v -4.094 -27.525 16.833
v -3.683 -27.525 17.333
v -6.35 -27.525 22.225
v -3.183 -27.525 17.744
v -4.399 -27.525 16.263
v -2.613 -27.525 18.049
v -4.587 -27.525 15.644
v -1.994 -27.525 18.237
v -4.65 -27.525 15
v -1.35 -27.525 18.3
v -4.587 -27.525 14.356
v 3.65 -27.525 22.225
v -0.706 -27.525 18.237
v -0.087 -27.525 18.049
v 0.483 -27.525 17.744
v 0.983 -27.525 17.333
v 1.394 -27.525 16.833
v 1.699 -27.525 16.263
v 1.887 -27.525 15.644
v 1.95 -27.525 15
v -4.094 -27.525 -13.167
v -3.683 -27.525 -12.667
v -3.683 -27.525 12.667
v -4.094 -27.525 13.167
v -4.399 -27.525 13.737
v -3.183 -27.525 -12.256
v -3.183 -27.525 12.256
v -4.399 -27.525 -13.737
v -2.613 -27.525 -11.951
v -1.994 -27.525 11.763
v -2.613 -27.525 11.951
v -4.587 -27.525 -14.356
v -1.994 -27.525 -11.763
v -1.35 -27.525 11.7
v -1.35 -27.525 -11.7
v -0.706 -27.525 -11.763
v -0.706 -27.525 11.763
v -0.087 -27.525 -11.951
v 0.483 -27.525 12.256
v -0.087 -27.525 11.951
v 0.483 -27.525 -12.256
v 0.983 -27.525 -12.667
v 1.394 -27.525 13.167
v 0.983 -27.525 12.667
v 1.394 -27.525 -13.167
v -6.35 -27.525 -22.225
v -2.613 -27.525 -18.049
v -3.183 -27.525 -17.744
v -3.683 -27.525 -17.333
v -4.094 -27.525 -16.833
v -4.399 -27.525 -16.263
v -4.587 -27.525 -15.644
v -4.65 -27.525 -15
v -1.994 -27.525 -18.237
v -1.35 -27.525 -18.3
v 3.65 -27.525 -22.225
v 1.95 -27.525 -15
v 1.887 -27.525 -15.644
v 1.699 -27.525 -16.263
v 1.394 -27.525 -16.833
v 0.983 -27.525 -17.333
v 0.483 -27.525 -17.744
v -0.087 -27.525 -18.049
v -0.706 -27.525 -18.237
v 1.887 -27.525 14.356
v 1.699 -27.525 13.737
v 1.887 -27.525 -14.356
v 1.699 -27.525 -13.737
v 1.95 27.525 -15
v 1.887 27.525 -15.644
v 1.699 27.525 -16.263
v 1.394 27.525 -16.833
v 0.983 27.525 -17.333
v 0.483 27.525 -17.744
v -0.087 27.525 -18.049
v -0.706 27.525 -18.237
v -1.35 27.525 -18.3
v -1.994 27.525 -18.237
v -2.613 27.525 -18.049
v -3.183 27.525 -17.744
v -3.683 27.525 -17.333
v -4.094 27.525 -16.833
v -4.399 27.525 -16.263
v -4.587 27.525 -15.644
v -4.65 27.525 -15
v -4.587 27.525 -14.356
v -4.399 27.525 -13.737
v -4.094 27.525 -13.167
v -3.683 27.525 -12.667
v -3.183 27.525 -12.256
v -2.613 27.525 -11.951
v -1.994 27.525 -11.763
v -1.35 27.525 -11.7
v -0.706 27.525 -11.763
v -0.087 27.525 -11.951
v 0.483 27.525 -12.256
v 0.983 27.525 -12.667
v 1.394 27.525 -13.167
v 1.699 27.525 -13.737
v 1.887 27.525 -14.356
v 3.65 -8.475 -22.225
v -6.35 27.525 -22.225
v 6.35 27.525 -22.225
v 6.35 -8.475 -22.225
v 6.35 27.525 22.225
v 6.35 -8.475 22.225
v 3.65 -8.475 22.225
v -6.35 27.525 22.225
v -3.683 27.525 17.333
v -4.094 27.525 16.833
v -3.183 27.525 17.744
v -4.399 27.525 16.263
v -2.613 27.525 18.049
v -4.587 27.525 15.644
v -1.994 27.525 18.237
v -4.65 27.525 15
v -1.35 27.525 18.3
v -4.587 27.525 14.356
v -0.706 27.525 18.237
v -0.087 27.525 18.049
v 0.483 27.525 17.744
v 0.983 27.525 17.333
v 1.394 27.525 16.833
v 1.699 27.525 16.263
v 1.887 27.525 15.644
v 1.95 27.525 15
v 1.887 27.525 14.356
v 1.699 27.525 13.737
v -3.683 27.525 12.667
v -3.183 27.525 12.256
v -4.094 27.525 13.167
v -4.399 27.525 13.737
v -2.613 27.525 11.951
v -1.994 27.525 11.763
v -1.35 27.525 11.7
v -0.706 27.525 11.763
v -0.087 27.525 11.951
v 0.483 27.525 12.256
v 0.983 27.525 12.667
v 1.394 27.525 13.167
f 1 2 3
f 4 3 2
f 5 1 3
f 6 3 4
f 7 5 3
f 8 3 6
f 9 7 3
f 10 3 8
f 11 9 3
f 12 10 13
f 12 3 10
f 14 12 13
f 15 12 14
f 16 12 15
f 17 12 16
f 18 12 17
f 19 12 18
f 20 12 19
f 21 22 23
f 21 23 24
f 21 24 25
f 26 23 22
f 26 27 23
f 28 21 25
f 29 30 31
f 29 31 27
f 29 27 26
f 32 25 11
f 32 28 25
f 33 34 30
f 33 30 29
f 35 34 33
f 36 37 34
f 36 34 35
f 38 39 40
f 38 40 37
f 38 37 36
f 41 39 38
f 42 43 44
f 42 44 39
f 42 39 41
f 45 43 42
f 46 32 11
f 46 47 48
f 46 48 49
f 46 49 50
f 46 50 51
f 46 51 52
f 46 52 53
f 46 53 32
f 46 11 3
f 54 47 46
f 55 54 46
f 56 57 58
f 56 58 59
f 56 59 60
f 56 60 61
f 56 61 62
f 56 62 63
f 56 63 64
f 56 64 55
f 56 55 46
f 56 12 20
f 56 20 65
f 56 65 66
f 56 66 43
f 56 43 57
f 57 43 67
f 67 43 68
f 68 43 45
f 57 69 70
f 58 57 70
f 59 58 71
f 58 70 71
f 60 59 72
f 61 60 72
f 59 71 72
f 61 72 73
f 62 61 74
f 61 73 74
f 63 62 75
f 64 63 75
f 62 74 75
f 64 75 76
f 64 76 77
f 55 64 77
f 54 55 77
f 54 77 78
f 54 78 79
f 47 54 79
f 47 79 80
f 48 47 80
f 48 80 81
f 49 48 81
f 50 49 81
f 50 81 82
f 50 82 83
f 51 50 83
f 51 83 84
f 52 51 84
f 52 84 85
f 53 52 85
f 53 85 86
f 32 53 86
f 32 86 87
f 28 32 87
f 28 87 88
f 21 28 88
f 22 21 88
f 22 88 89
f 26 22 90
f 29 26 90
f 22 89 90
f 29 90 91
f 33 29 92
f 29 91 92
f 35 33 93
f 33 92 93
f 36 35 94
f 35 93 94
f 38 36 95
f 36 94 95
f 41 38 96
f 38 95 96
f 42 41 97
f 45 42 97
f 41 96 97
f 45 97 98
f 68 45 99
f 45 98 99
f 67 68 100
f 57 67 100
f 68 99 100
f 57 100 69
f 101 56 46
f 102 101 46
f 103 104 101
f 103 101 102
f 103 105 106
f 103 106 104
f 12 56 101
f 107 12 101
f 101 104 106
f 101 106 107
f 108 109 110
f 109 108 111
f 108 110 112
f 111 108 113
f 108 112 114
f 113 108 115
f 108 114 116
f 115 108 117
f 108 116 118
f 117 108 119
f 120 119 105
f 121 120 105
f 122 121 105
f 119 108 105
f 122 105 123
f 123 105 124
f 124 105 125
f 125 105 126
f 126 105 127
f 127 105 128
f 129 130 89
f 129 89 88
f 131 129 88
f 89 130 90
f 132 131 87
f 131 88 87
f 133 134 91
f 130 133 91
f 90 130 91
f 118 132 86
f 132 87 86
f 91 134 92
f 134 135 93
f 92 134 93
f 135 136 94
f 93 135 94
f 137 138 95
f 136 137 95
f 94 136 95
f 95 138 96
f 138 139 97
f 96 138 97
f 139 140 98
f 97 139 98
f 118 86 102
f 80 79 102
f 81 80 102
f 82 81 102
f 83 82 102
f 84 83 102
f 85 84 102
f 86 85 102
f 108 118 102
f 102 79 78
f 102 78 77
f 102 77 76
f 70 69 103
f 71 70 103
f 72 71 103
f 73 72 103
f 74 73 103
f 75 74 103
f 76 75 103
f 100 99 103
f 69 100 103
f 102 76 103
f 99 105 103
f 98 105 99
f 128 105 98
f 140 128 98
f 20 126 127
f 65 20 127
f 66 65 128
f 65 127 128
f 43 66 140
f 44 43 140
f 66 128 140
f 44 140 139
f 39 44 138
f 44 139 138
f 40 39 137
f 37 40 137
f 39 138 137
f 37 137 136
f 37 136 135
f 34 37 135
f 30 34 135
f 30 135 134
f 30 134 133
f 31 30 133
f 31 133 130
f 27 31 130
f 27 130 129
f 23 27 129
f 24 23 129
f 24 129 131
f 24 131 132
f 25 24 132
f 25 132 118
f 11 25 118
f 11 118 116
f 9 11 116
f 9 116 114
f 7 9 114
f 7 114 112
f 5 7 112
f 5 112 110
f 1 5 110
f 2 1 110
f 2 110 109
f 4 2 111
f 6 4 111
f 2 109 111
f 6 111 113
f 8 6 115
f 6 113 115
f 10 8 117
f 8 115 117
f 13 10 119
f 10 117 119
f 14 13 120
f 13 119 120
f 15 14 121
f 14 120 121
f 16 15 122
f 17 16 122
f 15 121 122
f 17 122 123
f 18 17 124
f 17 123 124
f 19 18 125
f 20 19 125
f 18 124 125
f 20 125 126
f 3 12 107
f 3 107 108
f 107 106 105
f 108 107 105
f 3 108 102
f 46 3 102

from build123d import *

# Parameters (mm, degrees)
SKETCH1_W            = 44.45
SKETCH1_H            = 55.05
BOSS_EXTRUDE1_DEPTH  = 6.35
SKETCH2_W            = 2.7
SKETCH2_H            = 19.05
CUT_EXTRUDE1_DEPTH   = 53.666408886
M6_CLEARANCE_HOLE1_D = 6.6


with BuildPart() as part:
    # Sketch1 → Boss-Extrude1 (new, symmetric)
    with BuildSketch(Plane(origin=(0, 0, 0), x_dir=(0, 0, -1), z_dir=(1, 0, 0))):
        Rectangle(SKETCH1_W, SKETCH1_H)
    extrude(amount=BOSS_EXTRUDE1_DEPTH, both=True)

    # Sketch2 → Cut-Extrude1 (cut, through all)
    with BuildSketch(Plane(origin=(0, 0, -22.225), x_dir=(-1, 0, 0), z_dir=(0, 0, -1))):
        with Locations((-5, -18)):
            Rectangle(SKETCH2_W, SKETCH2_H)
    extrude(amount=-CUT_EXTRUDE1_DEPTH, mode=Mode.SUBTRACT)

    # M6 Clearance Hole1 (through all)
    with Locations(Plane(origin=(0, -27.525, 0), x_dir=(-1, 0, 0), z_dir=(0, -1, 0))):
        with Locations((1.35, 15), (1.35, -15)):
            Hole(M6_CLEARANCE_HOLE1_D / 2)


solid = part.part
